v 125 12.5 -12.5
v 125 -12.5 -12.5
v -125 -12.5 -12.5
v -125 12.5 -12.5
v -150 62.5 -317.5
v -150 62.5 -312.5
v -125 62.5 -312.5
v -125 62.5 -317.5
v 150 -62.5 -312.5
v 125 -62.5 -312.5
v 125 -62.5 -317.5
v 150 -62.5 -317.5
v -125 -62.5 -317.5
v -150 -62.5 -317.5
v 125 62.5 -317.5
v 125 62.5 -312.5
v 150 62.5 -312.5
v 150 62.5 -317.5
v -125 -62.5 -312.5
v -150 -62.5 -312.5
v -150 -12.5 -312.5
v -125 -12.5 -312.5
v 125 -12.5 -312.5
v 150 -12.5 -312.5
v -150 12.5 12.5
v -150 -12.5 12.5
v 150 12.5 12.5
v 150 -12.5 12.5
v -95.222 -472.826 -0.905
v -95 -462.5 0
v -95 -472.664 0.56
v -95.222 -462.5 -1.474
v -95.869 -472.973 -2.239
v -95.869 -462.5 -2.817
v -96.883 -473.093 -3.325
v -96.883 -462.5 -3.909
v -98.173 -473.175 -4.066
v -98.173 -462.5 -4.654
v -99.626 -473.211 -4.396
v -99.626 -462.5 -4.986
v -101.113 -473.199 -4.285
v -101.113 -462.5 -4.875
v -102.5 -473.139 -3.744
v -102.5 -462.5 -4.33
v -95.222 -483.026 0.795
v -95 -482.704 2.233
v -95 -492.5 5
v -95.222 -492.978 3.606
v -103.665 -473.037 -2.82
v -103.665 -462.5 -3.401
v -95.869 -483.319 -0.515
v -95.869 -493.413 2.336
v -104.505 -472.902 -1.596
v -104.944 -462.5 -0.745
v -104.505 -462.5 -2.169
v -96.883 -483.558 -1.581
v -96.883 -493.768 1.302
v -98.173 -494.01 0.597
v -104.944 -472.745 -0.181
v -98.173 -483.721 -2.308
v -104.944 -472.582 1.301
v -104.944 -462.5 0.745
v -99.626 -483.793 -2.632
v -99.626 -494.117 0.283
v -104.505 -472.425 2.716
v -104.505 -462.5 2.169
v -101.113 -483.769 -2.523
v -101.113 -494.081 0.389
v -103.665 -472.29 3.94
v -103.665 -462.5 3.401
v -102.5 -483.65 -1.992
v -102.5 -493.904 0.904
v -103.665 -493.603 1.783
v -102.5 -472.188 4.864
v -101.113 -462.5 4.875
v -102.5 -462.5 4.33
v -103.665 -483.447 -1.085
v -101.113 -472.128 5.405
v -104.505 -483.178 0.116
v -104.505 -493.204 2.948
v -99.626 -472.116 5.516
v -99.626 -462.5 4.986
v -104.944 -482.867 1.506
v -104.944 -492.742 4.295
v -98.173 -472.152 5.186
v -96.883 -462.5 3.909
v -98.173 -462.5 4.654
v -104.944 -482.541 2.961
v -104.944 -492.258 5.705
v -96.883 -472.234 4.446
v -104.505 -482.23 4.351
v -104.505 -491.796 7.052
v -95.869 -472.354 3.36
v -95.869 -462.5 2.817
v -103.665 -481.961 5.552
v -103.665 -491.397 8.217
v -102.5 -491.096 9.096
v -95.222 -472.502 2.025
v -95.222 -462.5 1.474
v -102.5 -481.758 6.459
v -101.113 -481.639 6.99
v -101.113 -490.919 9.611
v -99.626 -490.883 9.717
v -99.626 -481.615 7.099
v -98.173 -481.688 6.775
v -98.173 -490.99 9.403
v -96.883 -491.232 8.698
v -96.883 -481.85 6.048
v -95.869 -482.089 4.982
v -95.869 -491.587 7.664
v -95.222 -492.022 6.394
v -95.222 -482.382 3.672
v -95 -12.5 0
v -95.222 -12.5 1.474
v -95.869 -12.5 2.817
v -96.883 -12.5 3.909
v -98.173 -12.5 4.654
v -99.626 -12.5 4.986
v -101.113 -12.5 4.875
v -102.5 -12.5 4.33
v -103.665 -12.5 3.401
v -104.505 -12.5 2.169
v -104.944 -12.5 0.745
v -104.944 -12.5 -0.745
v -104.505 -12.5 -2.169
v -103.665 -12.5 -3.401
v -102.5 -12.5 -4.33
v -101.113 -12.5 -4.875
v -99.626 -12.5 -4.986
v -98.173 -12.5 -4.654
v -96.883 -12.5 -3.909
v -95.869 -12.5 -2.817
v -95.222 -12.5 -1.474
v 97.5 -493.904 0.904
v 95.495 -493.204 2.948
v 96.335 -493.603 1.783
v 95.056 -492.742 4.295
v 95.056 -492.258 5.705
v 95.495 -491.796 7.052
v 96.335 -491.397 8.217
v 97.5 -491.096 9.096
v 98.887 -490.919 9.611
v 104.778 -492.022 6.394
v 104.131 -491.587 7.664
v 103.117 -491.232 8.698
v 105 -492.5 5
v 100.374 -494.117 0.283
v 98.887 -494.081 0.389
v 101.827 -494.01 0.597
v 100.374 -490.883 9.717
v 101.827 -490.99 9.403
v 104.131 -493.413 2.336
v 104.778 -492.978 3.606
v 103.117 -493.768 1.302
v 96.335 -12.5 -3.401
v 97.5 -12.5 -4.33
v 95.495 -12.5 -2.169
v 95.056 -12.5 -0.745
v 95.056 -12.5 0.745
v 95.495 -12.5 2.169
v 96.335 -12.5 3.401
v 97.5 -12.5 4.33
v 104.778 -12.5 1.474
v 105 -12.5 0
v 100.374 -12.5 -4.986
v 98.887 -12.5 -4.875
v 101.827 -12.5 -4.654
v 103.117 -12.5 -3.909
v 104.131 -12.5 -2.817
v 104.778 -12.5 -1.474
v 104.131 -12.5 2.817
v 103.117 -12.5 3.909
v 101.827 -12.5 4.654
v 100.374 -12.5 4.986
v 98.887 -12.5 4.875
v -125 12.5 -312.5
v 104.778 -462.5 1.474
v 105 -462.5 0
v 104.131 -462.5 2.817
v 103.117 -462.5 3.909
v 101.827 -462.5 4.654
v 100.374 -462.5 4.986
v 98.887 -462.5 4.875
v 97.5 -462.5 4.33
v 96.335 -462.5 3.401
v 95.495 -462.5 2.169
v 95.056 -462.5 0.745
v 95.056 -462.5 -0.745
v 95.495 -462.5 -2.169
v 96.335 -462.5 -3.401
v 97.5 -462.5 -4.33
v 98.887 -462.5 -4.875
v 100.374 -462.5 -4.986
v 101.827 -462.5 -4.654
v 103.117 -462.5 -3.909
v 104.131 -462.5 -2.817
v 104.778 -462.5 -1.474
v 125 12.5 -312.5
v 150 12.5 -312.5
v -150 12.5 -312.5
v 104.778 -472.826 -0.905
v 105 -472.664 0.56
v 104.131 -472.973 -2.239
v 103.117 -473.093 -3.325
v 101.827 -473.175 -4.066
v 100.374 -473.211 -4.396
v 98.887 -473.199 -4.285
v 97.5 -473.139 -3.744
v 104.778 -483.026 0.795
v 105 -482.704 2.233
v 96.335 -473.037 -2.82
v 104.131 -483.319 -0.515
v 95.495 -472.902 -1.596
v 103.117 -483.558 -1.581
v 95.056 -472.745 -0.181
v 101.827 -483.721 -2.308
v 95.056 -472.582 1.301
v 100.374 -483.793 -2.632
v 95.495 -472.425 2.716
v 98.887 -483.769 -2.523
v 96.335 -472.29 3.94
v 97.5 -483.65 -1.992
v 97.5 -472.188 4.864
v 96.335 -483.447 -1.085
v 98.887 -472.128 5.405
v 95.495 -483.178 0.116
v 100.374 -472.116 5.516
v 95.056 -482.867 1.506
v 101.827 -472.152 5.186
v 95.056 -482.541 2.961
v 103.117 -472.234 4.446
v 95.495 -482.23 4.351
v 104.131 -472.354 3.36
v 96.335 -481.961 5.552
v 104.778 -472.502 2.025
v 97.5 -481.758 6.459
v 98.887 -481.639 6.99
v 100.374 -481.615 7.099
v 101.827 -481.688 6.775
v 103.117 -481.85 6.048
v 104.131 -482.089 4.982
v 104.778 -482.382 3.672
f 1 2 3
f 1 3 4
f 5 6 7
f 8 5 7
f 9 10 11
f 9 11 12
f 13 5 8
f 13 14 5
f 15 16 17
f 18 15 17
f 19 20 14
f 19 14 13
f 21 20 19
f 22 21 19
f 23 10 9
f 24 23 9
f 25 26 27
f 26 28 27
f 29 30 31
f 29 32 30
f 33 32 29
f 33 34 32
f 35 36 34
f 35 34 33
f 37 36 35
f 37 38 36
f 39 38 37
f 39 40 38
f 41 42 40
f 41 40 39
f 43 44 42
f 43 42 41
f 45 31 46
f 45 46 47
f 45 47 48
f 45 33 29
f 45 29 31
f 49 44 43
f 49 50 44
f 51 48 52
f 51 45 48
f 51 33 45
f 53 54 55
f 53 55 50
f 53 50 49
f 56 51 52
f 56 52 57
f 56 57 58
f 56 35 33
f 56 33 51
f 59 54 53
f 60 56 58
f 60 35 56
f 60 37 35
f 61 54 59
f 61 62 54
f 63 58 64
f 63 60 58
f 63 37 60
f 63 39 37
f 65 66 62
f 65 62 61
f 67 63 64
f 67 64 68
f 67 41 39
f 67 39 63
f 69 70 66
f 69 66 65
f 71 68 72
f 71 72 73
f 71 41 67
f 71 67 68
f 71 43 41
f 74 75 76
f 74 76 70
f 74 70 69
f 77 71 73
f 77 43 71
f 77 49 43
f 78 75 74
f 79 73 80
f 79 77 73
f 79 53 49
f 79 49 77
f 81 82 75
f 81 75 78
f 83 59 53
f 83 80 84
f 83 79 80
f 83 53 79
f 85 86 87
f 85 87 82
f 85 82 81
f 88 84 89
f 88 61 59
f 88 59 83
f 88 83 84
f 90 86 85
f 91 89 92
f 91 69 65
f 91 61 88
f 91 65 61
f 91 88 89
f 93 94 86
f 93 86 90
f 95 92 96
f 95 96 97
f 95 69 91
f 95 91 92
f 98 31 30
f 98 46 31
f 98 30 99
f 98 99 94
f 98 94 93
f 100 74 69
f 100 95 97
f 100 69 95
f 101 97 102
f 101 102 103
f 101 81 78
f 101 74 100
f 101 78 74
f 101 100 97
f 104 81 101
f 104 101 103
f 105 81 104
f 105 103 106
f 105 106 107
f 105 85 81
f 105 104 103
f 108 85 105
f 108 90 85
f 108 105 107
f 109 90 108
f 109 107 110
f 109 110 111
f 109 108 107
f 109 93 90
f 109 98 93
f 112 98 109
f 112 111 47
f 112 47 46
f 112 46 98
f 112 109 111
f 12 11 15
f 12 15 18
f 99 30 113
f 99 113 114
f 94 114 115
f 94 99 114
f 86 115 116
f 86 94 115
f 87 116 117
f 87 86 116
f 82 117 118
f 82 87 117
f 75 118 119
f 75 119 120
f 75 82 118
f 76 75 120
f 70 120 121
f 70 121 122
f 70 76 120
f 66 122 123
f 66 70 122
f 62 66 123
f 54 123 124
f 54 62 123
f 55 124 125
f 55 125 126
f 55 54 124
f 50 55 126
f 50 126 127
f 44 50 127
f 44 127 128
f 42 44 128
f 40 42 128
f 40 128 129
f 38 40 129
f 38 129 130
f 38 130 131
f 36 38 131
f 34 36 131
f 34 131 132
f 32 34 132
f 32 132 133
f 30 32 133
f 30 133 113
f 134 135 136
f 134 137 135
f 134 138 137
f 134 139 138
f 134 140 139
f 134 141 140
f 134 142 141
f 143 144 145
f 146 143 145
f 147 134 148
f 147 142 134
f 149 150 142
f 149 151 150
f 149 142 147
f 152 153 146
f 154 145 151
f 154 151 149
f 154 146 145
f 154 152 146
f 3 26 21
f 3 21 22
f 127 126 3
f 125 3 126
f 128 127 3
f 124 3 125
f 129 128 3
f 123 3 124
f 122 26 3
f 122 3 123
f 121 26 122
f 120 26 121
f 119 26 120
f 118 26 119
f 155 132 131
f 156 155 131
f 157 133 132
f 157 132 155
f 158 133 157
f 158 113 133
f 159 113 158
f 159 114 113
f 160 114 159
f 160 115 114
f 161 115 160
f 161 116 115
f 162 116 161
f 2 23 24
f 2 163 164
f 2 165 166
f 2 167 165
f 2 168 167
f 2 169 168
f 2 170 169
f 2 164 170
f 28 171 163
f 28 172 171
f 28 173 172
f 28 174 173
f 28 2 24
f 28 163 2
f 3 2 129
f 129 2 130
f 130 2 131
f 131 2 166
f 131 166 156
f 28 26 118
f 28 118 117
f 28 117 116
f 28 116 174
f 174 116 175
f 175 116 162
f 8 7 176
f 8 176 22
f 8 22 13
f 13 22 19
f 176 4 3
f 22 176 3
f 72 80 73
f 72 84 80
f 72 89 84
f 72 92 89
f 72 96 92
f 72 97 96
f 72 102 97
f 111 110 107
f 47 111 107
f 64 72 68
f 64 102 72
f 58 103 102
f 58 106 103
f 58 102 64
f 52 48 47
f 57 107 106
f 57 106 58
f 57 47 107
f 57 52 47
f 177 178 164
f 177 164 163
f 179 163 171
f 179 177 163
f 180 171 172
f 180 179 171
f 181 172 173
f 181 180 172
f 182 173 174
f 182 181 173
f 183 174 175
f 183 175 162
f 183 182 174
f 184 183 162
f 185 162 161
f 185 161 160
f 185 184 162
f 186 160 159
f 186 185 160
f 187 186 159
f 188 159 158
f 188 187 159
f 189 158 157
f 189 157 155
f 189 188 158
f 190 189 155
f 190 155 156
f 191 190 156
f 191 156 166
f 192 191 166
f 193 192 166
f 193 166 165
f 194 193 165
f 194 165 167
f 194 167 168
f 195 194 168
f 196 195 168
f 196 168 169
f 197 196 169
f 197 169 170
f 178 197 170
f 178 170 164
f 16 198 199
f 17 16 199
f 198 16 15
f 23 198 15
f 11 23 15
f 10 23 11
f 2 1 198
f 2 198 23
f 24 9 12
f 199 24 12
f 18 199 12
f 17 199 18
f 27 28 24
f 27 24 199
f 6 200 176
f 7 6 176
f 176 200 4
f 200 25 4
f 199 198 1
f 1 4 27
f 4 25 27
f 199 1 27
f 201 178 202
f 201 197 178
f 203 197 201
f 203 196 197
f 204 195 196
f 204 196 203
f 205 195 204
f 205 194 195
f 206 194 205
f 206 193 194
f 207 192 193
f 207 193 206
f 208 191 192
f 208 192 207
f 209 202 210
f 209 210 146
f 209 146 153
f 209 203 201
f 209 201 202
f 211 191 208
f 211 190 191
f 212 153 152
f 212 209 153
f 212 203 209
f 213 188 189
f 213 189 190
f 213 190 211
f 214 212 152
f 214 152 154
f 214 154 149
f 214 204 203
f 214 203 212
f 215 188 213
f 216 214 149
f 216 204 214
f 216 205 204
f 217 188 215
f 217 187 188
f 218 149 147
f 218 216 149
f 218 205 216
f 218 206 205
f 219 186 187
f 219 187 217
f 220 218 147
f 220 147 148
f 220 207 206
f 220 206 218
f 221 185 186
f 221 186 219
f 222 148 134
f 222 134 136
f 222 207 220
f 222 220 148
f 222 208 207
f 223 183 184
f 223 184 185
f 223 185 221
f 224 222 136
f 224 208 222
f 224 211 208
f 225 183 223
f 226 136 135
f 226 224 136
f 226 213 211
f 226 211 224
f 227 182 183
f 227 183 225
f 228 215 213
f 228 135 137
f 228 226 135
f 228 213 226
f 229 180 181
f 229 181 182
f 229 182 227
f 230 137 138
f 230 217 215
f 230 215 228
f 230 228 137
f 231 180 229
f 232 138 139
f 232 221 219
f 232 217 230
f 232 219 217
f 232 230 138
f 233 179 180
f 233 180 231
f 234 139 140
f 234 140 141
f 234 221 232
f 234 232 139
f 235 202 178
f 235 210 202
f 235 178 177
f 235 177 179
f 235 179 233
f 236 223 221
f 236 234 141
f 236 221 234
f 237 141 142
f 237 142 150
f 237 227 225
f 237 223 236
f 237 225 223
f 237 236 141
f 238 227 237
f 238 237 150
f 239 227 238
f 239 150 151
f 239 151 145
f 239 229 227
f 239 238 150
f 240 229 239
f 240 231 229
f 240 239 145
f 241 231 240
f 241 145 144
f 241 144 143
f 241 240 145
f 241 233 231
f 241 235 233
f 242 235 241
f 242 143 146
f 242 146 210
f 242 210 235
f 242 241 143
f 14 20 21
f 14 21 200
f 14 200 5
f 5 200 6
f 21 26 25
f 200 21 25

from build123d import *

# Parameters (mm, degrees)
F0_W          = 25
F0_H          = 25
F1_DEPTH      = 150
F1_DEPTH_BACK = 150
F2_R          = 5
F5_W          = 25
F5_H          = 25
F6_DEPTH      = 300
F7_W          = 25
F7_H          = 25
F7_H_2        = 50
F8_DEPTH      = 5


with BuildPart() as f1:
    # F0 (on Right) → F1 (new body, two sides)
    with BuildSketch(Plane.YZ) as f1_sk:
        Rectangle(F0_W, F0_H)
    extrude(amount=F1_DEPTH)
    extrude(f1_sk.sketch, amount=-F1_DEPTH_BACK)

    # F4: sweep along a path in F3
    with BuildLine(Plane.YZ) as f4_path:
        Line((-12.5, 0), (-462.5, 0))
        ThreePointArc((-462.5, 0), (-477.7069063257, 1.2585620455), (-492.5, 5))
    # F2 (on face) → F4 (sweep)
    with BuildSketch(Plane.XZ.offset(12.5)):
        with Locations((-100, 0)):
            Circle(F2_R)
        with Locations((100, 0)):
            Circle(F2_R)
    sweep(path=f4_path.line)

    # F5 (on face) → F6 (join)
    with BuildSketch(Plane(origin=(0, 0, -12.5), x_dir=(1, 0, 0), z_dir=(0, 0, -1))):
        with Locations((-137.5, 0)):
            Rectangle(F5_W, F5_H)
        with Locations((137.5, 0)):
            Rectangle(F5_W, F5_H)
    extrude(amount=F6_DEPTH)

    # F7 (on face) → F8 (join)
    with BuildSketch(Plane(origin=(0, 0, -312.5), x_dir=(1, 0, 0), z_dir=(0, 0, -1))):
        with Locations((-137.5, 0)):
            Rectangle(F7_W, F7_H)
        with Locations((-137.5, -37.5)):
            Rectangle(F7_W, F7_H_2)
        with Locations((-137.5, 37.5)):
            Rectangle(F7_W, F7_H_2)
        with Locations((137.5, 0)):
            Rectangle(F7_W, F7_H)
        with Locations((137.5, 37.5)):
            Rectangle(F7_W, F7_H_2)
        with Locations((137.5, -37.5)):
            Rectangle(F7_W, F7_H_2)
    extrude(amount=F8_DEPTH)


solid = f1.part
